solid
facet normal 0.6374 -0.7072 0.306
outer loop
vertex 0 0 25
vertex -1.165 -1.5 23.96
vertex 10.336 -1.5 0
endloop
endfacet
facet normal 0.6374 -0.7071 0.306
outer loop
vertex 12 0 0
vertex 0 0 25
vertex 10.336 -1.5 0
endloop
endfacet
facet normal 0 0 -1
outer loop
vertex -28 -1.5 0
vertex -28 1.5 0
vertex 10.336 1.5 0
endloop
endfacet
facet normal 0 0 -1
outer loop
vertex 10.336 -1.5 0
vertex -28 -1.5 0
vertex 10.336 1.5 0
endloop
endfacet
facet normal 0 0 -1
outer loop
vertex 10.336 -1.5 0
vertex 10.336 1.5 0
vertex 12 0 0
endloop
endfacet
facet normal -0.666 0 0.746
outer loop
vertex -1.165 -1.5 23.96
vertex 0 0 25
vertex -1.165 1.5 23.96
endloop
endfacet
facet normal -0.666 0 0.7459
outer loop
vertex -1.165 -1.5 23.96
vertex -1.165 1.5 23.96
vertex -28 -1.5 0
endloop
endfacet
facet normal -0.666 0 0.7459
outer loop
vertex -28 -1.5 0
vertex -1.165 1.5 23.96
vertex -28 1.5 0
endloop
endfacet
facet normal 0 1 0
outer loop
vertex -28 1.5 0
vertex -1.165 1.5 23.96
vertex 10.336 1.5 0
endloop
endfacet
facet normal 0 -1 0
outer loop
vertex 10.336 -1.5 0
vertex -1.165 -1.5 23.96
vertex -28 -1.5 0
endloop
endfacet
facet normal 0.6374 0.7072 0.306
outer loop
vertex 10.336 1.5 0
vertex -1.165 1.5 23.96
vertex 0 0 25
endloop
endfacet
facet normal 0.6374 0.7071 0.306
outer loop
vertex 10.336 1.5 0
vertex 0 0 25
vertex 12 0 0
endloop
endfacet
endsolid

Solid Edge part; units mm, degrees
sketch "Sketch1" plane through (0, 0, 0) normal (0, -1, 0) x (1, 0, 0)
  line L0 (0, 25) -> (-28, 0)
  line L1 (-28, 0) -> (12, 0)
  line L2 (12, 0) -> (0, 25)
extrude "Protrusion1" add sketch "Sketch1" along normal mid plane 3
chamfer "Chamfer_2" distance 1.5 angle 45 2 edges at (6, 1.5, 12.5) (6, -1.5, 12.5)
